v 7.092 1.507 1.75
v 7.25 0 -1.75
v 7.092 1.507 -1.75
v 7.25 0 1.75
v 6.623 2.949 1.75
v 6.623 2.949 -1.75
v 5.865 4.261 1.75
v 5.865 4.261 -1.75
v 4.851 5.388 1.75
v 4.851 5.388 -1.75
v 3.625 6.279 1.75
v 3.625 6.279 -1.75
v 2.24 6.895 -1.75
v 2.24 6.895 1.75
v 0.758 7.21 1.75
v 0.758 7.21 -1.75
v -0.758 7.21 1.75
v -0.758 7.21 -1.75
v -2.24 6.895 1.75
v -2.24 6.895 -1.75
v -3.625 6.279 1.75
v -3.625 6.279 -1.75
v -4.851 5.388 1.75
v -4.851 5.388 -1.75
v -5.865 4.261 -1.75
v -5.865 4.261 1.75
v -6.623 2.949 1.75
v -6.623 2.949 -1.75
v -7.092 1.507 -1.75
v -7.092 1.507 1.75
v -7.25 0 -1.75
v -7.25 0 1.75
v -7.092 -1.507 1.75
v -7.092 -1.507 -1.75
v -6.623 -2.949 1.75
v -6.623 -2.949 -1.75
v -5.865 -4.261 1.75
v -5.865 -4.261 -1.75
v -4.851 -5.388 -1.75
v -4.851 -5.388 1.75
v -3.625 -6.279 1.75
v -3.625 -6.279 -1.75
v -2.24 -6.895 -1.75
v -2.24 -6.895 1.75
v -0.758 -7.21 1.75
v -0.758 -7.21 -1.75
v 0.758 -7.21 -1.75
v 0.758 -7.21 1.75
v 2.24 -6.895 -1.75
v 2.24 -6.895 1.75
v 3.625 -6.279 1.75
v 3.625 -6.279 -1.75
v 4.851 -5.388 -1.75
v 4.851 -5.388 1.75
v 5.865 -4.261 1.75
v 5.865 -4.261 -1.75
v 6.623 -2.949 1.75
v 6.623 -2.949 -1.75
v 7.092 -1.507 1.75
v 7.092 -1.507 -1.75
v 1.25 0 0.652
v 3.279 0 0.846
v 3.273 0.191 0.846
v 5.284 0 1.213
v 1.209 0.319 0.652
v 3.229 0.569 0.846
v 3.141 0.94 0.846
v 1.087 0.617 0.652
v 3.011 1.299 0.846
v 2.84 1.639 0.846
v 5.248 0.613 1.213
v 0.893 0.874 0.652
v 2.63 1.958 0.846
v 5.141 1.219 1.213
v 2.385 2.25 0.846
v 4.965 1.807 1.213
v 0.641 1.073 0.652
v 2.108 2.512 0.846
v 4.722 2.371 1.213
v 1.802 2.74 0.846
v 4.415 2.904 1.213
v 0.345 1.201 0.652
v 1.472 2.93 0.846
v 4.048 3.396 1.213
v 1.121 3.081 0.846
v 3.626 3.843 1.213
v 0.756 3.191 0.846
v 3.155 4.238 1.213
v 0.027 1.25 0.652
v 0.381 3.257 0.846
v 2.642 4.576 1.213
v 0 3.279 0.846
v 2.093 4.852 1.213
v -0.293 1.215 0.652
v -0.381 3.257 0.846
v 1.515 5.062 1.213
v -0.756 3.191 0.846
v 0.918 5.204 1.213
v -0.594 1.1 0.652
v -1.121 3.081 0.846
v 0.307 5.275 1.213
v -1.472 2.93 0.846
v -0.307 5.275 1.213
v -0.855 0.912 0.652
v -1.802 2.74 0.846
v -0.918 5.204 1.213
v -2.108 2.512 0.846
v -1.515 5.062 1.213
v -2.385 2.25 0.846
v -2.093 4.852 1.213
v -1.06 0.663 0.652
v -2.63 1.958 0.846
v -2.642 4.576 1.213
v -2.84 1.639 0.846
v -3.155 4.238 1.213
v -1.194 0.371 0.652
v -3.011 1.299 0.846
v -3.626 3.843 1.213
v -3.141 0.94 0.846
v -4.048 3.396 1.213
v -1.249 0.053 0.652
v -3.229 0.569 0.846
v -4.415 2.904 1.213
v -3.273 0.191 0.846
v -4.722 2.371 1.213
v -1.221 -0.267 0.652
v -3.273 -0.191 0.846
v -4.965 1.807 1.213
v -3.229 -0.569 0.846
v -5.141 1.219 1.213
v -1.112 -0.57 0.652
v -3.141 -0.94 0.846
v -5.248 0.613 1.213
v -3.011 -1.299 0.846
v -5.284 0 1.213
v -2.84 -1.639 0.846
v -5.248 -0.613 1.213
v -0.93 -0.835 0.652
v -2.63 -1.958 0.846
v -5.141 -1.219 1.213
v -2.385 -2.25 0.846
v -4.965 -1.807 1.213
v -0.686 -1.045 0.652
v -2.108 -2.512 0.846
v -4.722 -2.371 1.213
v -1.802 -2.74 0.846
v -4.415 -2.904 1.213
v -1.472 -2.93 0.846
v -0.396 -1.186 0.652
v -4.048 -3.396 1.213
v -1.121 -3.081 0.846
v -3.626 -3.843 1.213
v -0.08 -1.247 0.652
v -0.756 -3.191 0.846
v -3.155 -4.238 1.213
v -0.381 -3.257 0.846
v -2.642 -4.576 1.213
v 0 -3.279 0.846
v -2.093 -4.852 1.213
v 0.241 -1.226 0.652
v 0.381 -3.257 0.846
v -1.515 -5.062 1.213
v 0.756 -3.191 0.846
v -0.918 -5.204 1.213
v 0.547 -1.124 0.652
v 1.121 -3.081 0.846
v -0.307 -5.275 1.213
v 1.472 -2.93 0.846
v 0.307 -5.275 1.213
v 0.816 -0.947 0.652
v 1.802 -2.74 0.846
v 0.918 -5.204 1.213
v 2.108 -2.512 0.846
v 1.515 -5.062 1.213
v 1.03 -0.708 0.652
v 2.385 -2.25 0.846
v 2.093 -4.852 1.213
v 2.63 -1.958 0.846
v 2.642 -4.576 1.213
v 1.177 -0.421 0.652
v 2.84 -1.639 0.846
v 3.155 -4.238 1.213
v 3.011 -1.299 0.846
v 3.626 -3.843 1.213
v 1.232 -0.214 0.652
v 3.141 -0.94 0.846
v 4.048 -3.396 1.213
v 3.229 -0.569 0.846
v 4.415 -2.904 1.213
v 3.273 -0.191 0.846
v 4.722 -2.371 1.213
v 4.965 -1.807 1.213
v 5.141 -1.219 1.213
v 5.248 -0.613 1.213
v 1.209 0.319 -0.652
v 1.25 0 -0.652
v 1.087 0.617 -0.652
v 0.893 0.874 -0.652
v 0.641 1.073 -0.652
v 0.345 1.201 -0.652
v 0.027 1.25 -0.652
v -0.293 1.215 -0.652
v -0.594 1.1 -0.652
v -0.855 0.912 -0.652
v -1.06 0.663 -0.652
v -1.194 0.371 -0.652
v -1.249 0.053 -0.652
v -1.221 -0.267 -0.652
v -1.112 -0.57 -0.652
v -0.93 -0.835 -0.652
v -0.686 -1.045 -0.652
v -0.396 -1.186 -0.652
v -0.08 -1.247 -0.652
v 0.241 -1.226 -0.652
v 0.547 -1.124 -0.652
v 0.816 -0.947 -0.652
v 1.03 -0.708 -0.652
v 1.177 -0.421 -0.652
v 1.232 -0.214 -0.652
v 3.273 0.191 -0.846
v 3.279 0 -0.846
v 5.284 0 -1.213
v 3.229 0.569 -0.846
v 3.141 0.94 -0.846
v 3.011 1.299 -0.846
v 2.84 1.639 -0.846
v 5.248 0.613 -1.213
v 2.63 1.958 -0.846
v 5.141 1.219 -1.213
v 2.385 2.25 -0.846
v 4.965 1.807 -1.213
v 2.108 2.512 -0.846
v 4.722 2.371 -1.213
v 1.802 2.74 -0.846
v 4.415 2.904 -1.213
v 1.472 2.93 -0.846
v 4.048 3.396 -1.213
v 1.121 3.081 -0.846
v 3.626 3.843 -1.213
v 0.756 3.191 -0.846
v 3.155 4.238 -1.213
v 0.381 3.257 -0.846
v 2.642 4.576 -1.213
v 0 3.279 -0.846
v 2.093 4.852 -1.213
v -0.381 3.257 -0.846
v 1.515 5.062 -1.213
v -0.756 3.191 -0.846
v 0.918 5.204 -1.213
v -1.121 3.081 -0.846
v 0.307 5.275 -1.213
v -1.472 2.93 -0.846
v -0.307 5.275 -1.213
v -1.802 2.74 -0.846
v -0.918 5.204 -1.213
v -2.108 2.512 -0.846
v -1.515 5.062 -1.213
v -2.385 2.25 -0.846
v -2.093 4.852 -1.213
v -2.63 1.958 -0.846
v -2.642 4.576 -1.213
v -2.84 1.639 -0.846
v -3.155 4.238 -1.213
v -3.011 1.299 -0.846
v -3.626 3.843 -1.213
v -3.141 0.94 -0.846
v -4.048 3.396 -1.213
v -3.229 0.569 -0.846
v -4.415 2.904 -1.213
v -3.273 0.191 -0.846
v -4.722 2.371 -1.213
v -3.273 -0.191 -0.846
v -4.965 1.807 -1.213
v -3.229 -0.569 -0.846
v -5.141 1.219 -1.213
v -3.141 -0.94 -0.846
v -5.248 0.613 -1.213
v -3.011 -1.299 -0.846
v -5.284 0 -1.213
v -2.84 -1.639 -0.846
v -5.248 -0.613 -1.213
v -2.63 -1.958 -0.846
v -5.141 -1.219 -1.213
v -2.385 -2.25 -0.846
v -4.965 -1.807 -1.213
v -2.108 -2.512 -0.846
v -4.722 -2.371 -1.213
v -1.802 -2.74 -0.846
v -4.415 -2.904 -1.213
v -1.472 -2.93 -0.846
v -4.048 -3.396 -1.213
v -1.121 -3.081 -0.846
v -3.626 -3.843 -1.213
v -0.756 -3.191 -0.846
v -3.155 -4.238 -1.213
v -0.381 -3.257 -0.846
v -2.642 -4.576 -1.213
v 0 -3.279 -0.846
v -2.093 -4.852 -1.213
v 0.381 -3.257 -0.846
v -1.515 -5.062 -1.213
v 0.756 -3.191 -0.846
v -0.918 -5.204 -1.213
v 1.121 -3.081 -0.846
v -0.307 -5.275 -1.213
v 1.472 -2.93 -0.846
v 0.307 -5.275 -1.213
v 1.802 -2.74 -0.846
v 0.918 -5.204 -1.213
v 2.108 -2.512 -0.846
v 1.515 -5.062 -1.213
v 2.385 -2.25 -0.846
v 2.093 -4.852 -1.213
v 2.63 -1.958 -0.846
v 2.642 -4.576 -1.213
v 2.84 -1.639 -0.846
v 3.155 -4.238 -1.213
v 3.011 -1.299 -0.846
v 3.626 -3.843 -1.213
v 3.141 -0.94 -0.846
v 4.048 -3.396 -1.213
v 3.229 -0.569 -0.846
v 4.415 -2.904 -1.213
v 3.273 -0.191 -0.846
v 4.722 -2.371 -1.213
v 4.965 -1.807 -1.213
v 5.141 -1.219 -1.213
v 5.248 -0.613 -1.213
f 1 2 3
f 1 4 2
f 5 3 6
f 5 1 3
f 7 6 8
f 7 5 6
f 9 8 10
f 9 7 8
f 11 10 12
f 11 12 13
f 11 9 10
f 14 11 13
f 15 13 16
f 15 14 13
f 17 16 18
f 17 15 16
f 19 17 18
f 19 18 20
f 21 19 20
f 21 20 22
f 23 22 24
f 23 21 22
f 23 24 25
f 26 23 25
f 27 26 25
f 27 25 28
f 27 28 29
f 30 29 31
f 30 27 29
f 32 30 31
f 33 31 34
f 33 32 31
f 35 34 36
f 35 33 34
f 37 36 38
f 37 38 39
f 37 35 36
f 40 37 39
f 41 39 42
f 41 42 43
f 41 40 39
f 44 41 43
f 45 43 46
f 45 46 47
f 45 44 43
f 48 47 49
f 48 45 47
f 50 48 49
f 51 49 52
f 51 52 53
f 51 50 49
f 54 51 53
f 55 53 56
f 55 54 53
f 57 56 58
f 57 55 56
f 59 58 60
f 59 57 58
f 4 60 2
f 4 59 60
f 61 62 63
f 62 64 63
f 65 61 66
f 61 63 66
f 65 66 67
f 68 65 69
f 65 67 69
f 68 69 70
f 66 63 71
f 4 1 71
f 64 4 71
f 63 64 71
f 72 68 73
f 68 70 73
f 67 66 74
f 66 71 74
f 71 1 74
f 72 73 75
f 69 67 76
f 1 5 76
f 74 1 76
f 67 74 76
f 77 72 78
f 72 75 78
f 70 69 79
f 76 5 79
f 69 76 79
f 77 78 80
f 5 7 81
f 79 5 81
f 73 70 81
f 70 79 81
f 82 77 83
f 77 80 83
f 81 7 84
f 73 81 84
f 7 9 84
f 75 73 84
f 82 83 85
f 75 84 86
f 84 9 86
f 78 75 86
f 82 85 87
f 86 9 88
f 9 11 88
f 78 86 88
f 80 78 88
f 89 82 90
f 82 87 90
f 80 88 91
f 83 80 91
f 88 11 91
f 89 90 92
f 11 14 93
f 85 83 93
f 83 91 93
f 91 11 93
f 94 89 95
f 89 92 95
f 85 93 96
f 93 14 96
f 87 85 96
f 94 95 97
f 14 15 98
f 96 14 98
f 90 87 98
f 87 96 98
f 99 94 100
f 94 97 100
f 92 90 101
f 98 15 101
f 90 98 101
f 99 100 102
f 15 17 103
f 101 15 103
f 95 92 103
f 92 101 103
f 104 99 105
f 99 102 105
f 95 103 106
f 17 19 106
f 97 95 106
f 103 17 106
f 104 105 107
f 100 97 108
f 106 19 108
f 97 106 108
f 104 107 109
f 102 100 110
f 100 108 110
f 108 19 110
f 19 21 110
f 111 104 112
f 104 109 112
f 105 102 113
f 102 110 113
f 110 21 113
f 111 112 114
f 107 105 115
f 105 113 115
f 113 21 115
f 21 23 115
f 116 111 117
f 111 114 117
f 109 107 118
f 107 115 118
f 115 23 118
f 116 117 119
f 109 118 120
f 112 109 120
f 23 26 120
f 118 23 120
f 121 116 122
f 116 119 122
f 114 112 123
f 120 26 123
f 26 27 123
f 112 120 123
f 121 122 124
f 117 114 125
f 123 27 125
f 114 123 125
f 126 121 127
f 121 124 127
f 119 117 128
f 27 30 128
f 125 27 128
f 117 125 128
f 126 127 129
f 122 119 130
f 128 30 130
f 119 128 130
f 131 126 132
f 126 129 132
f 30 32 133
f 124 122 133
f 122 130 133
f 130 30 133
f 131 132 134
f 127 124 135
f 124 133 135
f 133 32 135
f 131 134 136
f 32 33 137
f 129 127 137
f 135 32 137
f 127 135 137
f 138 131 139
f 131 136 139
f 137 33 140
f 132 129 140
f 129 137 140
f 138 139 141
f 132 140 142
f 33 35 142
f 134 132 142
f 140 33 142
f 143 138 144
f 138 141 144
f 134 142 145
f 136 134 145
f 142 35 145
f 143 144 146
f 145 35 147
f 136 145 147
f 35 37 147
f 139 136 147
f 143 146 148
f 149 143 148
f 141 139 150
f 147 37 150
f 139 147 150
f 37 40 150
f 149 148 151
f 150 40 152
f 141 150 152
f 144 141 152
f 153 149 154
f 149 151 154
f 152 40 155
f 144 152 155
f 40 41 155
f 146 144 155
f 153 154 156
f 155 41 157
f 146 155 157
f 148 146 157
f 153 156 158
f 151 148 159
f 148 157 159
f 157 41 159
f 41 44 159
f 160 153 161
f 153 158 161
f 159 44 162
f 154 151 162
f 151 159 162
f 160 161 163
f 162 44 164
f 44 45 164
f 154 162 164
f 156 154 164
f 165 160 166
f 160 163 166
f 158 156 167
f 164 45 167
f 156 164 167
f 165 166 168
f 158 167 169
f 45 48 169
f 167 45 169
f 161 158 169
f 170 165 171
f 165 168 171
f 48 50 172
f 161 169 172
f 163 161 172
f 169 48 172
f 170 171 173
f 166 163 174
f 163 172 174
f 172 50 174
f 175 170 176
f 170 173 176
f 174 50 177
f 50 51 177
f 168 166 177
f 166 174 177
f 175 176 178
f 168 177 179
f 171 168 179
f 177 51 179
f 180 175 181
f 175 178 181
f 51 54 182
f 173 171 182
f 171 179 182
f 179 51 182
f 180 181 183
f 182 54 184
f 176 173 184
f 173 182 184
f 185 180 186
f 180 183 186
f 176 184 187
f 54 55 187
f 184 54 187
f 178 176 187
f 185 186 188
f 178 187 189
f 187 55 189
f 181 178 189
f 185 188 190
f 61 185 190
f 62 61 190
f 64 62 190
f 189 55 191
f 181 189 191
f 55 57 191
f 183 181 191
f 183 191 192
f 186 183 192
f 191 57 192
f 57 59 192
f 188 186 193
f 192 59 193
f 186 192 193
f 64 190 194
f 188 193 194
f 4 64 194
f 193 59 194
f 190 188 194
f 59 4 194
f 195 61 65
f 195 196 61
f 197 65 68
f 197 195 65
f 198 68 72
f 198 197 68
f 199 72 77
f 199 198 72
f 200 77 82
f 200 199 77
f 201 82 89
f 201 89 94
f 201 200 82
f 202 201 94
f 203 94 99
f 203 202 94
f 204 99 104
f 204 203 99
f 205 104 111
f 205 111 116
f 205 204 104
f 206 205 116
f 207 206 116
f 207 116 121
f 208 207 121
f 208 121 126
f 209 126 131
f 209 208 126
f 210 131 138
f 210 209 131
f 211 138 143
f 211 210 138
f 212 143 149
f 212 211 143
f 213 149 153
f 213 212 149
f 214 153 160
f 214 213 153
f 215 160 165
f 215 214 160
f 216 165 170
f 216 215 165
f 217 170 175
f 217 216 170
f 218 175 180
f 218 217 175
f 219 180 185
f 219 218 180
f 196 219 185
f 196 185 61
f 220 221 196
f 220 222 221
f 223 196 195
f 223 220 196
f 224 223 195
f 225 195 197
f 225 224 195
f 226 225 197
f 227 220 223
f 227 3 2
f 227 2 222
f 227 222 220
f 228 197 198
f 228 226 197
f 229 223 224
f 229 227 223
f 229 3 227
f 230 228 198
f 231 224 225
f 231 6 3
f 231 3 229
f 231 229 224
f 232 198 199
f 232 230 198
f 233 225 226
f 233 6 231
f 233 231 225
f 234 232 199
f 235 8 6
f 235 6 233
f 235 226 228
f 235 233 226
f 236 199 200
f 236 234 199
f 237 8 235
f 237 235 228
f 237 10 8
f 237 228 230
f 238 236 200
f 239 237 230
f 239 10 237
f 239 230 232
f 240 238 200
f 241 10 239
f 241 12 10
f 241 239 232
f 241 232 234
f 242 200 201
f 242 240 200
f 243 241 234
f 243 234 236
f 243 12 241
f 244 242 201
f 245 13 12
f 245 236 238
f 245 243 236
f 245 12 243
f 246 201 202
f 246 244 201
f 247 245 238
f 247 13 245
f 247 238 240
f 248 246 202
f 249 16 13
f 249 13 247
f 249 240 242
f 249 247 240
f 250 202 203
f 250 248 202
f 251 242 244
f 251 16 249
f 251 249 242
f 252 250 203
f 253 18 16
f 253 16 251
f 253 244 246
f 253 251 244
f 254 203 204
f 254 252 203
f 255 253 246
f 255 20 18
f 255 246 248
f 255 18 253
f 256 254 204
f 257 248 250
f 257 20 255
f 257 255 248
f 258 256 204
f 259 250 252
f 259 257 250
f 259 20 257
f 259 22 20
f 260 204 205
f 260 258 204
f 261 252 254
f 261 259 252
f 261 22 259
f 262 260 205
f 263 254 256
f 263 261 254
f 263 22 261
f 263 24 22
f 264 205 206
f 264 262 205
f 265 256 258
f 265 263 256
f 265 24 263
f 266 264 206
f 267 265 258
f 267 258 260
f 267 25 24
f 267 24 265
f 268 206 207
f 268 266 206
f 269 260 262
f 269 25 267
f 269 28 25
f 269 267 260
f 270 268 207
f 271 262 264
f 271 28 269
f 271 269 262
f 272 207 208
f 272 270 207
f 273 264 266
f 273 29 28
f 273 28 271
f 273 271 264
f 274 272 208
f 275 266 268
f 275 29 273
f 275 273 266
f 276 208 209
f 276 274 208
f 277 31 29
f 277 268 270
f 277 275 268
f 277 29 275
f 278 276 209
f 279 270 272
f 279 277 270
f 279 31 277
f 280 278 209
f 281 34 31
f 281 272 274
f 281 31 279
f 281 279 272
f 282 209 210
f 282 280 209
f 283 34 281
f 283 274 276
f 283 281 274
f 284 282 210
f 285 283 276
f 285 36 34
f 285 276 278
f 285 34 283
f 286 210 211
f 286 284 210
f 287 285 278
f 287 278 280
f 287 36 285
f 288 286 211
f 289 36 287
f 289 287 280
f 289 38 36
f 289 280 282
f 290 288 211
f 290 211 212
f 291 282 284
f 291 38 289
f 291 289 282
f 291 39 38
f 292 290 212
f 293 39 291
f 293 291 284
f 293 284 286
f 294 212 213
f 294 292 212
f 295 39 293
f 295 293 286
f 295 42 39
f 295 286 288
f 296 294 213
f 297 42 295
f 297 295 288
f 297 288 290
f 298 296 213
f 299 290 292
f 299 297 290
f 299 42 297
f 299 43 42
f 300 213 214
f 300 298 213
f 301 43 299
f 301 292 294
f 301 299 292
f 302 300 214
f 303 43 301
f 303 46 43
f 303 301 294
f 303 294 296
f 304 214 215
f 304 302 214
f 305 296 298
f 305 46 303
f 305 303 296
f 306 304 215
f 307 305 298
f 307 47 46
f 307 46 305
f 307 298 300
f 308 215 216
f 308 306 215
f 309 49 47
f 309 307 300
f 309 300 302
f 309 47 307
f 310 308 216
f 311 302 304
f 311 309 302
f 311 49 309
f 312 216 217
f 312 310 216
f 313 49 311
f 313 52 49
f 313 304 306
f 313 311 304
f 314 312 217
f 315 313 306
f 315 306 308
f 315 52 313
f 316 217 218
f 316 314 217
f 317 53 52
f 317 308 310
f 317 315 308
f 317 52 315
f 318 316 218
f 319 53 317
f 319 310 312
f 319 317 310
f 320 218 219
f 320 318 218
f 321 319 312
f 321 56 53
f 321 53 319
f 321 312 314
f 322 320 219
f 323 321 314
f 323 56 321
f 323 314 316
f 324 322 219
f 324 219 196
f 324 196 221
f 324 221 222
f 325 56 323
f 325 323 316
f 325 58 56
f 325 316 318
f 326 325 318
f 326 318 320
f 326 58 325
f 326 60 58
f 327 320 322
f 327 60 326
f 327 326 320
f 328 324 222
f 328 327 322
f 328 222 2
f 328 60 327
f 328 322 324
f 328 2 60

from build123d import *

# Parameters (mm, degrees)
SKETCH1_R           = 7.25
SKETCH1_R_2         = 1.25
BOSS_EXTRUDE1_DEPTH = 1.75


with BuildPart() as part:
    # Sketch1 → Boss-Extrude1 (new, symmetric)
    with BuildSketch(Plane.XY):
        Circle(SKETCH1_R)
        Circle(SKETCH1_R_2, mode=Mode.SUBTRACT)
    extrude(amount=BOSS_EXTRUDE1_DEPTH, both=True)

    # Sketch2 → Cut-Revolve1 (revolve, cut)
    with BuildSketch(Plane(origin=(0, 0, 0), x_dir=(1, 0, 0), z_dir=(0, 1, 0))):
        with BuildLine():
            Line((0, 1.75), (-7.25, 1.75))
            ThreePointArc((-7.250000000000001, 1.7499999999999964), (-3.668842228906902, 0.903465385674501), (3.5283e-13, 0.6190211308572593))
            Line((2e-16, 0.6190211308572557), (4e-16, 1.75))
        make_face()
    cut_revolve1 = revolve(axis=Axis((7.9e-16, 0, -3.982137231966947), (-1.8e-16, 0, 1)), mode=Mode.SUBTRACT)

    # Mirror1: Cut-Revolve1 across plane
    add(cut_revolve1.mirror(Plane.XY), mode=Mode.SUBTRACT)


solid = part.part
